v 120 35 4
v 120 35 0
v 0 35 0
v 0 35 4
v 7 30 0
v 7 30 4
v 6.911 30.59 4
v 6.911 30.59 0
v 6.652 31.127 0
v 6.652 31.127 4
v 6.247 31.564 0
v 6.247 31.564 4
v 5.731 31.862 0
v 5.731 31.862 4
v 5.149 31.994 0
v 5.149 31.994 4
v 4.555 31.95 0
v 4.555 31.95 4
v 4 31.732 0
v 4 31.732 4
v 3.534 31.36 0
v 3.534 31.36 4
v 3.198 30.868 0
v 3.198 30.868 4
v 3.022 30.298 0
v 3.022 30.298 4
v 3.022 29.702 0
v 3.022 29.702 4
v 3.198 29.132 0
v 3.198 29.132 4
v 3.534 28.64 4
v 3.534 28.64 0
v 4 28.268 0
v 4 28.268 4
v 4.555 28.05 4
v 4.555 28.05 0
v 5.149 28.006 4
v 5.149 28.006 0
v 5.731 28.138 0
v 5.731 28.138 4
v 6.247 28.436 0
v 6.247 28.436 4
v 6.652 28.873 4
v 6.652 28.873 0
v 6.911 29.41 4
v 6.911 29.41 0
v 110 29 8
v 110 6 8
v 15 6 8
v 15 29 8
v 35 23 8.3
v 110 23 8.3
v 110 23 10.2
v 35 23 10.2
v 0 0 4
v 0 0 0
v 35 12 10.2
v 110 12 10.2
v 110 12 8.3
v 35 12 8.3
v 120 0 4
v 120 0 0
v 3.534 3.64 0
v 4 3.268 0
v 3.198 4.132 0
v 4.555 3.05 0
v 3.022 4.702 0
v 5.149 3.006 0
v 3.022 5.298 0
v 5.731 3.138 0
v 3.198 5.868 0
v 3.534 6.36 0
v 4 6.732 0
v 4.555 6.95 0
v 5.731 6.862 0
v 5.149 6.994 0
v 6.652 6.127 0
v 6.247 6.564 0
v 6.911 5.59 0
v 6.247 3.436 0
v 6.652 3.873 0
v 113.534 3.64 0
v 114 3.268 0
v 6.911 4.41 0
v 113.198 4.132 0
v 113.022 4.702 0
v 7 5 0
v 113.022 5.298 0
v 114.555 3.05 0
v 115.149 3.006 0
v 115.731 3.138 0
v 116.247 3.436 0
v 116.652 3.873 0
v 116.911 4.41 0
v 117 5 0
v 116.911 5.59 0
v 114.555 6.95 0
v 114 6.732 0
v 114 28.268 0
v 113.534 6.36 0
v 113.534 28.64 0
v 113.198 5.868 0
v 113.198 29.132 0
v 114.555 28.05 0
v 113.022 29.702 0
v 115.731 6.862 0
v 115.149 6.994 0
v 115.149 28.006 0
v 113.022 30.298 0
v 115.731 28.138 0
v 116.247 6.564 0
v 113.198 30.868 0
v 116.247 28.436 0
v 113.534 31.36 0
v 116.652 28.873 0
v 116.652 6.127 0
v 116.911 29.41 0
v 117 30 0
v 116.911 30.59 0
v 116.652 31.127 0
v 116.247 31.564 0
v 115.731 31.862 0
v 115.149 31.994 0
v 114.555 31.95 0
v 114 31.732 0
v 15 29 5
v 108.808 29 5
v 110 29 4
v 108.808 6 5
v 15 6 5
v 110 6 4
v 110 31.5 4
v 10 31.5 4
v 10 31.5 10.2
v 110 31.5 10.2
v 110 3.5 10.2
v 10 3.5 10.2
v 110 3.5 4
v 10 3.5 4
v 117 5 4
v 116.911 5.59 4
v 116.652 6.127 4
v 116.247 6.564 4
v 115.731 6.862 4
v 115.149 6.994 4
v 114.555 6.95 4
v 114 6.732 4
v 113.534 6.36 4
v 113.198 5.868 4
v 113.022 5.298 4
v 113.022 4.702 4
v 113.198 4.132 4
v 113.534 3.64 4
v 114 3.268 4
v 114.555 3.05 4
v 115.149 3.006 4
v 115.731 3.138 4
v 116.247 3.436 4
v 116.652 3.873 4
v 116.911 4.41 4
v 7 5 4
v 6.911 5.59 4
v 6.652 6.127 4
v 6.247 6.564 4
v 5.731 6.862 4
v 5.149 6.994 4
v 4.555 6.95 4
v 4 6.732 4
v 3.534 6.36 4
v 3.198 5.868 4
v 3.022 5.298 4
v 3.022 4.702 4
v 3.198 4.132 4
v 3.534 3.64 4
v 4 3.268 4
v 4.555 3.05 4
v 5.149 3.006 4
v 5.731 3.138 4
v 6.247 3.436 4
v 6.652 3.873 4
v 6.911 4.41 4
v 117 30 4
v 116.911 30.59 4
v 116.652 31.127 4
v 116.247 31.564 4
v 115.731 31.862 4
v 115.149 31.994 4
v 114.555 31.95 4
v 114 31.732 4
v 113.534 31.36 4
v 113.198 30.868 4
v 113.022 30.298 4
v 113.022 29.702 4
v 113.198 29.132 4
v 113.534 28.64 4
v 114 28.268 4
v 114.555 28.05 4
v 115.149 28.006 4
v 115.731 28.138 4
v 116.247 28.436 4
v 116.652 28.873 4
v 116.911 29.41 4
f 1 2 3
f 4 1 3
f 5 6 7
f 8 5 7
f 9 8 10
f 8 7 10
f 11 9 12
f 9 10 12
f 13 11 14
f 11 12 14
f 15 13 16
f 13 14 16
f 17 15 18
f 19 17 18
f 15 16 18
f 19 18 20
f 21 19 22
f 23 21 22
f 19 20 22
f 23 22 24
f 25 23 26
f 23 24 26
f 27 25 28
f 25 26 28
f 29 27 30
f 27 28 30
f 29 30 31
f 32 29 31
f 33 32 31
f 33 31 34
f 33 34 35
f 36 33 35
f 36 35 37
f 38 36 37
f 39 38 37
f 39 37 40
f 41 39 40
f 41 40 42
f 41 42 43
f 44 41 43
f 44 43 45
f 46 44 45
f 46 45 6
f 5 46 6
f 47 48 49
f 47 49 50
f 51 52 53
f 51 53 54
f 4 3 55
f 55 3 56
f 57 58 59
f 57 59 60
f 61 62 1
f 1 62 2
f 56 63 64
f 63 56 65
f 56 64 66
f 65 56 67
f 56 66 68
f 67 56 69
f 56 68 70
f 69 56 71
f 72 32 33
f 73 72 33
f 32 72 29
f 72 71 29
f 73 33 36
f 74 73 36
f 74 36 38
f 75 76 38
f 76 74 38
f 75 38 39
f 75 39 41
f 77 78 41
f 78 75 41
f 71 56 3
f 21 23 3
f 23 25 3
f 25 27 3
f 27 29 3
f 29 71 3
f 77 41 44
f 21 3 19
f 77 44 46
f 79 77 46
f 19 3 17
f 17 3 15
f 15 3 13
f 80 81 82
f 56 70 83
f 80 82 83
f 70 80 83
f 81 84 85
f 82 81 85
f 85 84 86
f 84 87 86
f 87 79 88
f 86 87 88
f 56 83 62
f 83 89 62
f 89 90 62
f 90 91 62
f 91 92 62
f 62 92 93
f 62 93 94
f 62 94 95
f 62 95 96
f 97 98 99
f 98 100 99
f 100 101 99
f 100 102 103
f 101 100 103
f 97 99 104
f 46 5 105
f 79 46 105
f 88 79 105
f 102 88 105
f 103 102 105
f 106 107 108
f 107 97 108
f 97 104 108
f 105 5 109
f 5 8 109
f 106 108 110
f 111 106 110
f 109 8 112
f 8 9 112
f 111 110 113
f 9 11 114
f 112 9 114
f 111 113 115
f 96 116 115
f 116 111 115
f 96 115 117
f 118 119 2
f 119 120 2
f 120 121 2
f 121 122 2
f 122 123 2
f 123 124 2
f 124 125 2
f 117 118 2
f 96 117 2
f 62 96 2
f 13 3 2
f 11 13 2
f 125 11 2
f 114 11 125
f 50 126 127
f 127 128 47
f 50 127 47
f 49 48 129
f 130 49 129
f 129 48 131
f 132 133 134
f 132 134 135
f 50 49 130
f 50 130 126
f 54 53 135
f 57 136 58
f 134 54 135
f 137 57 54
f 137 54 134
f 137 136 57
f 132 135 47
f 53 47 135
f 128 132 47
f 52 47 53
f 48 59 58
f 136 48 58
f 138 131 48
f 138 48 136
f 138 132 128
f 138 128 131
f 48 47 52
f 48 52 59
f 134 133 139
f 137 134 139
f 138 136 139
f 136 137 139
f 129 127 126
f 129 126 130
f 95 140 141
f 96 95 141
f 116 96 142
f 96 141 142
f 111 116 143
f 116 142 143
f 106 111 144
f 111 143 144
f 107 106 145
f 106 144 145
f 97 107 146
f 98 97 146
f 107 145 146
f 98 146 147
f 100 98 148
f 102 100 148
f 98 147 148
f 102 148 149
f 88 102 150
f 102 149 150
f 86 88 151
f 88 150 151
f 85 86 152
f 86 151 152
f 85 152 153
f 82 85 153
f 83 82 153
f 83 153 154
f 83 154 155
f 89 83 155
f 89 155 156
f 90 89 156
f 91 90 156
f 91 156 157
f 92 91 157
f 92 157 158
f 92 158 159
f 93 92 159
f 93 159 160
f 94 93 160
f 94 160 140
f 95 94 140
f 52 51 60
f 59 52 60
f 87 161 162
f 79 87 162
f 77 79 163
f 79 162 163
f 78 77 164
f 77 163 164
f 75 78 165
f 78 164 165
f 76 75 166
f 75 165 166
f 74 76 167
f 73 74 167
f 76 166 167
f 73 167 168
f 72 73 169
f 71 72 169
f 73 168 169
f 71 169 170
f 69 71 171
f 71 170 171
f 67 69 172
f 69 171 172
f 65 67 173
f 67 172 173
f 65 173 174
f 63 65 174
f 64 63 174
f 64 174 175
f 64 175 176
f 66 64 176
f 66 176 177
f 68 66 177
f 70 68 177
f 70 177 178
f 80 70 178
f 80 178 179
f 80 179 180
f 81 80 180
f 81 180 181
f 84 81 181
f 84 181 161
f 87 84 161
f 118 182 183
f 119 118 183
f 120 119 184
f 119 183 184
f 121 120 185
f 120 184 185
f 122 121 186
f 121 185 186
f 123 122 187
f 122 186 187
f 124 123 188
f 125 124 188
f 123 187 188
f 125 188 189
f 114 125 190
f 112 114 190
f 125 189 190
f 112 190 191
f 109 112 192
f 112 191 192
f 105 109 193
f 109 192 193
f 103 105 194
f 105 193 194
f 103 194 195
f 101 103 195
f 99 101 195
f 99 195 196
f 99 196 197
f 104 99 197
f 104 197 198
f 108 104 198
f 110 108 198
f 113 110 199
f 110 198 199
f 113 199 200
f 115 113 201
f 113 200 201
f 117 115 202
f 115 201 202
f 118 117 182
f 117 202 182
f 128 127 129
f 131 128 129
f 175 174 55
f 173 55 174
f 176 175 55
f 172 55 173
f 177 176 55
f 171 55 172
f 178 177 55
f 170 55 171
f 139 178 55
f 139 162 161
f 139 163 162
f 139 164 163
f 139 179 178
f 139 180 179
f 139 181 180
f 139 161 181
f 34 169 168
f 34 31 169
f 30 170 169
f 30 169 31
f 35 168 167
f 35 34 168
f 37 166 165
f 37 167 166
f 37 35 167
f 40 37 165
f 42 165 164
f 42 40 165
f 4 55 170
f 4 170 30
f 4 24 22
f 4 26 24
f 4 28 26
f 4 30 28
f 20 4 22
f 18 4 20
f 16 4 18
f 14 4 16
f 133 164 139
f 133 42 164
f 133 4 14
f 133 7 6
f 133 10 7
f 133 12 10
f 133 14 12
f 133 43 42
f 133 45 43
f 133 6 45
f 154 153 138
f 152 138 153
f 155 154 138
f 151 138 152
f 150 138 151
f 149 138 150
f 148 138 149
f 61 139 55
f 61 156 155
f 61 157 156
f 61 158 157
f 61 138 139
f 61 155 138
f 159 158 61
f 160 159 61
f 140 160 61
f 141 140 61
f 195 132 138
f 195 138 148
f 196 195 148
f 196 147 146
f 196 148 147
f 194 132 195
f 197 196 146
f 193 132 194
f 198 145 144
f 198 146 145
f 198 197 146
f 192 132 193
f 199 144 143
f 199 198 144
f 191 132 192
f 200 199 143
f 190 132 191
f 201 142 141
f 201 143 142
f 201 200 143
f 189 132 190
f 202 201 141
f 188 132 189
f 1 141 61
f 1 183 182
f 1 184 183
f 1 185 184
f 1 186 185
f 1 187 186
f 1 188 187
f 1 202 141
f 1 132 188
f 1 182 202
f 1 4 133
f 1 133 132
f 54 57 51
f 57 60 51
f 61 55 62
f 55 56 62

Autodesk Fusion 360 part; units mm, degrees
sketch "Esboço1" plane through (0, 0, 0) normal (0, 0, 1) x (1, 0, 0)
  line L0 (0, 0) -> (120, 0)
  line L1 (120, 0) -> (120, 35)
  line L2 (120, 35) -> (0, 35)
  line L3 (0, 35) -> (0, 0)
  dimension "d1" = 120
  dimension "d2" = 35
extrude "Extrusão1" add sketch "Esboço1" along normal blind 4
sketch "Esboço2" plane through (0, 0, 4) normal (0, 0, 1) x (-1, 0, 0)
  line L0 (0, -35) -> (0, 0)
  line L1 (0, 0) -> (-120, 0)
  line L2 (-120, 0) -> (-120, -35)
  line L3 (-120, -35) -> (0, -35)
  line L4 (-10, -30) -> (-110, -30)
  line L5 (-110, -30) -> (-110, -5)
  line L6 (-110, -5) -> (-10, -5)
  line L7 (-10, -5) -> (-10, -30)
  point P0 (-5, -30)
  point P1 (-5, -5)
  point P2 (-115, -5)
  point P3 (-115, -30)
extrude "Extrusão2" add sketch "Esboço2" along normal blind 5 contours L4 L5 L6 L7
sketch "Esboço3" plane through (0, 0, 9) normal (0, 0, 1) x (-1, 0, 0)
  line L0 (-10, -5) -> (-110, -5)
  line L1 (-110, -5) -> (-110, -30)
  line L2 (-110, -30) -> (-10, -30)
  line L3 (-10, -30) -> (-10, -5)
sketch "Esboço4" plane through (110, 0, 0) normal (1, 0, 0) x (0, 1, 0)
  line L0 (5, 4) -> (30, 4)
  line L1 (30, 4) -> (30, 9)
  line L2 (30, 9) -> (5, 9)
  line L3 (5, 9) -> (5, 4)
  line L4 (5, 9) -> (5, 8)
  line L5 (30, 9) -> (30, 8)
  line L6 (5, 8) -> (30, 8)
  line L7 (6, 8) -> (6, 5)
  line L8 (6, 5) -> (29, 5)
  line L9 (29, 5) -> (29, 8)
extrude "Extrusão3" cut sketch "Esboço4" against normal blind 95 contours L6 L7 L8 L9
sketch "Esboço5" plane through (0, 0, 9) normal (0, 0, 1) x (1, 0, 0)
  line L0 (110, 30) -> (110, 23)
  line L1 (110, 5) -> (110, 12)
  line L2 (110, 23) -> (35, 23)
  line L3 (110, 12) -> (35, 12)
  line L4 (35, 12) -> (35, 23)
  line L5 (110, 23) -> (110, 12)
  dimension "d9" = 7
  dimension "d10" = 7
extrude "Extrusão4" cut sketch "Esboço5" against normal blind 5
sketch "Esboço6" plane through (0, 0, 4) normal (0, 0, 1) x (1, 0, 0)
extrude "Extrusão5" add 1 faces at (35, 15.6667, 4.3333) along direction (1, 0, 0) blind 75
sketch "Esboço7" plane through (110, 0, 0) normal (1, 0, 0) x (0, 1, 0)
  line L0 (5, 4) -> (30, 4)
  line L1 (30, 4) -> (30, 9)
  line L2 (30, 9) -> (23, 9)
  line L3 (23, 9) -> (23, 8)
  line L4 (23, 8) -> (29, 8)
  line L5 (29, 8) -> (29, 5)
  line L6 (29, 5) -> (6, 5)
  line L7 (6, 5) -> (6, 8)
  line L8 (6, 8) -> (12, 8)
  line L9 (12, 8) -> (12, 9)
  line L10 (12, 9) -> (5, 9)
  line L11 (5, 9) -> (5, 4)
  line L12 (6, 8) -> (29, 8)
  line L13 (29, 8) -> (29, 8.3)
  line L14 (29, 8.3) -> (6, 8.3)
  line L15 (6, 8.3) -> (6, 8)
  dimension "d15" = 0.3
extrude "Extrusão6" add sketch "Esboço7" against normal blind 75 contours L3 L9 L12 L14
sketch "Esboço8" plane through (0, 0, 4) normal (0, 0, 1) x (1, 0, 0)
  circle A0 centre (5, 30) radius 2
  circle A1 centre (5, 5) radius 2
  circle A2 centre (115, 30) radius 2
  circle A3 centre (115, 5) radius 2
  dimension "d18" = 4
  dimension "d19" = 4
  dimension "d20" = 4
  dimension "d21" = 4
extrude "Extrusão7" cut sketch "Esboço8" against normal blind 20
sketch "Esboço9" plane through (10, 0, 0) normal (-1, 0, 0) x (0, -1, 0)
  line L0 (-30, 4) -> (-5, 4)
  line L1 (-5, 4) -> (-5, 9)
  line L2 (-5, 9) -> (-30, 9)
  line L3 (-30, 9) -> (-30, 4)
  line L4 (-30, 9) -> (-31.5, 9)
  line L5 (-31.5, 9) -> (-31.5, 4)
  line L6 (-31.5, 4) -> (-30, 4)
  line L7 (-30, 4) -> (-30, 9)
  line L8 (-5, 9) -> (-3.5, 9)
  line L9 (-3.5, 9) -> (-3.5, 4)
  line L10 (-3.5, 4) -> (-5, 4)
  line L11 (-5, 4) -> (-5, 9)
  dimension "d24" = 1.5
  dimension "d25" = 1.5
  dimension "d26" = 5
extrude "Extrusão8" add sketch "Esboço9" against normal blind 100 contours L3 L4 L5 L6 L7 | L1 L8 L9 L10 L11
extrude "Extrusão9" add 1 faces at (18.3333, 19.3333, 9) along direction (0, 0, 1) blind 1.2
chamfer "Chanfro1" distance 1 angle 50 1 edges at (110, 17.5, 5) measured on face at (110, 4.3333, 7.4)
equation "d24 = ( 0.3 * 5 ) * 1 mm"
equation "d25 = ( 0.3 * 5 ) * 1 mm"
equation "d29 = ( 0.3 * 4 ) * 1 mm"
